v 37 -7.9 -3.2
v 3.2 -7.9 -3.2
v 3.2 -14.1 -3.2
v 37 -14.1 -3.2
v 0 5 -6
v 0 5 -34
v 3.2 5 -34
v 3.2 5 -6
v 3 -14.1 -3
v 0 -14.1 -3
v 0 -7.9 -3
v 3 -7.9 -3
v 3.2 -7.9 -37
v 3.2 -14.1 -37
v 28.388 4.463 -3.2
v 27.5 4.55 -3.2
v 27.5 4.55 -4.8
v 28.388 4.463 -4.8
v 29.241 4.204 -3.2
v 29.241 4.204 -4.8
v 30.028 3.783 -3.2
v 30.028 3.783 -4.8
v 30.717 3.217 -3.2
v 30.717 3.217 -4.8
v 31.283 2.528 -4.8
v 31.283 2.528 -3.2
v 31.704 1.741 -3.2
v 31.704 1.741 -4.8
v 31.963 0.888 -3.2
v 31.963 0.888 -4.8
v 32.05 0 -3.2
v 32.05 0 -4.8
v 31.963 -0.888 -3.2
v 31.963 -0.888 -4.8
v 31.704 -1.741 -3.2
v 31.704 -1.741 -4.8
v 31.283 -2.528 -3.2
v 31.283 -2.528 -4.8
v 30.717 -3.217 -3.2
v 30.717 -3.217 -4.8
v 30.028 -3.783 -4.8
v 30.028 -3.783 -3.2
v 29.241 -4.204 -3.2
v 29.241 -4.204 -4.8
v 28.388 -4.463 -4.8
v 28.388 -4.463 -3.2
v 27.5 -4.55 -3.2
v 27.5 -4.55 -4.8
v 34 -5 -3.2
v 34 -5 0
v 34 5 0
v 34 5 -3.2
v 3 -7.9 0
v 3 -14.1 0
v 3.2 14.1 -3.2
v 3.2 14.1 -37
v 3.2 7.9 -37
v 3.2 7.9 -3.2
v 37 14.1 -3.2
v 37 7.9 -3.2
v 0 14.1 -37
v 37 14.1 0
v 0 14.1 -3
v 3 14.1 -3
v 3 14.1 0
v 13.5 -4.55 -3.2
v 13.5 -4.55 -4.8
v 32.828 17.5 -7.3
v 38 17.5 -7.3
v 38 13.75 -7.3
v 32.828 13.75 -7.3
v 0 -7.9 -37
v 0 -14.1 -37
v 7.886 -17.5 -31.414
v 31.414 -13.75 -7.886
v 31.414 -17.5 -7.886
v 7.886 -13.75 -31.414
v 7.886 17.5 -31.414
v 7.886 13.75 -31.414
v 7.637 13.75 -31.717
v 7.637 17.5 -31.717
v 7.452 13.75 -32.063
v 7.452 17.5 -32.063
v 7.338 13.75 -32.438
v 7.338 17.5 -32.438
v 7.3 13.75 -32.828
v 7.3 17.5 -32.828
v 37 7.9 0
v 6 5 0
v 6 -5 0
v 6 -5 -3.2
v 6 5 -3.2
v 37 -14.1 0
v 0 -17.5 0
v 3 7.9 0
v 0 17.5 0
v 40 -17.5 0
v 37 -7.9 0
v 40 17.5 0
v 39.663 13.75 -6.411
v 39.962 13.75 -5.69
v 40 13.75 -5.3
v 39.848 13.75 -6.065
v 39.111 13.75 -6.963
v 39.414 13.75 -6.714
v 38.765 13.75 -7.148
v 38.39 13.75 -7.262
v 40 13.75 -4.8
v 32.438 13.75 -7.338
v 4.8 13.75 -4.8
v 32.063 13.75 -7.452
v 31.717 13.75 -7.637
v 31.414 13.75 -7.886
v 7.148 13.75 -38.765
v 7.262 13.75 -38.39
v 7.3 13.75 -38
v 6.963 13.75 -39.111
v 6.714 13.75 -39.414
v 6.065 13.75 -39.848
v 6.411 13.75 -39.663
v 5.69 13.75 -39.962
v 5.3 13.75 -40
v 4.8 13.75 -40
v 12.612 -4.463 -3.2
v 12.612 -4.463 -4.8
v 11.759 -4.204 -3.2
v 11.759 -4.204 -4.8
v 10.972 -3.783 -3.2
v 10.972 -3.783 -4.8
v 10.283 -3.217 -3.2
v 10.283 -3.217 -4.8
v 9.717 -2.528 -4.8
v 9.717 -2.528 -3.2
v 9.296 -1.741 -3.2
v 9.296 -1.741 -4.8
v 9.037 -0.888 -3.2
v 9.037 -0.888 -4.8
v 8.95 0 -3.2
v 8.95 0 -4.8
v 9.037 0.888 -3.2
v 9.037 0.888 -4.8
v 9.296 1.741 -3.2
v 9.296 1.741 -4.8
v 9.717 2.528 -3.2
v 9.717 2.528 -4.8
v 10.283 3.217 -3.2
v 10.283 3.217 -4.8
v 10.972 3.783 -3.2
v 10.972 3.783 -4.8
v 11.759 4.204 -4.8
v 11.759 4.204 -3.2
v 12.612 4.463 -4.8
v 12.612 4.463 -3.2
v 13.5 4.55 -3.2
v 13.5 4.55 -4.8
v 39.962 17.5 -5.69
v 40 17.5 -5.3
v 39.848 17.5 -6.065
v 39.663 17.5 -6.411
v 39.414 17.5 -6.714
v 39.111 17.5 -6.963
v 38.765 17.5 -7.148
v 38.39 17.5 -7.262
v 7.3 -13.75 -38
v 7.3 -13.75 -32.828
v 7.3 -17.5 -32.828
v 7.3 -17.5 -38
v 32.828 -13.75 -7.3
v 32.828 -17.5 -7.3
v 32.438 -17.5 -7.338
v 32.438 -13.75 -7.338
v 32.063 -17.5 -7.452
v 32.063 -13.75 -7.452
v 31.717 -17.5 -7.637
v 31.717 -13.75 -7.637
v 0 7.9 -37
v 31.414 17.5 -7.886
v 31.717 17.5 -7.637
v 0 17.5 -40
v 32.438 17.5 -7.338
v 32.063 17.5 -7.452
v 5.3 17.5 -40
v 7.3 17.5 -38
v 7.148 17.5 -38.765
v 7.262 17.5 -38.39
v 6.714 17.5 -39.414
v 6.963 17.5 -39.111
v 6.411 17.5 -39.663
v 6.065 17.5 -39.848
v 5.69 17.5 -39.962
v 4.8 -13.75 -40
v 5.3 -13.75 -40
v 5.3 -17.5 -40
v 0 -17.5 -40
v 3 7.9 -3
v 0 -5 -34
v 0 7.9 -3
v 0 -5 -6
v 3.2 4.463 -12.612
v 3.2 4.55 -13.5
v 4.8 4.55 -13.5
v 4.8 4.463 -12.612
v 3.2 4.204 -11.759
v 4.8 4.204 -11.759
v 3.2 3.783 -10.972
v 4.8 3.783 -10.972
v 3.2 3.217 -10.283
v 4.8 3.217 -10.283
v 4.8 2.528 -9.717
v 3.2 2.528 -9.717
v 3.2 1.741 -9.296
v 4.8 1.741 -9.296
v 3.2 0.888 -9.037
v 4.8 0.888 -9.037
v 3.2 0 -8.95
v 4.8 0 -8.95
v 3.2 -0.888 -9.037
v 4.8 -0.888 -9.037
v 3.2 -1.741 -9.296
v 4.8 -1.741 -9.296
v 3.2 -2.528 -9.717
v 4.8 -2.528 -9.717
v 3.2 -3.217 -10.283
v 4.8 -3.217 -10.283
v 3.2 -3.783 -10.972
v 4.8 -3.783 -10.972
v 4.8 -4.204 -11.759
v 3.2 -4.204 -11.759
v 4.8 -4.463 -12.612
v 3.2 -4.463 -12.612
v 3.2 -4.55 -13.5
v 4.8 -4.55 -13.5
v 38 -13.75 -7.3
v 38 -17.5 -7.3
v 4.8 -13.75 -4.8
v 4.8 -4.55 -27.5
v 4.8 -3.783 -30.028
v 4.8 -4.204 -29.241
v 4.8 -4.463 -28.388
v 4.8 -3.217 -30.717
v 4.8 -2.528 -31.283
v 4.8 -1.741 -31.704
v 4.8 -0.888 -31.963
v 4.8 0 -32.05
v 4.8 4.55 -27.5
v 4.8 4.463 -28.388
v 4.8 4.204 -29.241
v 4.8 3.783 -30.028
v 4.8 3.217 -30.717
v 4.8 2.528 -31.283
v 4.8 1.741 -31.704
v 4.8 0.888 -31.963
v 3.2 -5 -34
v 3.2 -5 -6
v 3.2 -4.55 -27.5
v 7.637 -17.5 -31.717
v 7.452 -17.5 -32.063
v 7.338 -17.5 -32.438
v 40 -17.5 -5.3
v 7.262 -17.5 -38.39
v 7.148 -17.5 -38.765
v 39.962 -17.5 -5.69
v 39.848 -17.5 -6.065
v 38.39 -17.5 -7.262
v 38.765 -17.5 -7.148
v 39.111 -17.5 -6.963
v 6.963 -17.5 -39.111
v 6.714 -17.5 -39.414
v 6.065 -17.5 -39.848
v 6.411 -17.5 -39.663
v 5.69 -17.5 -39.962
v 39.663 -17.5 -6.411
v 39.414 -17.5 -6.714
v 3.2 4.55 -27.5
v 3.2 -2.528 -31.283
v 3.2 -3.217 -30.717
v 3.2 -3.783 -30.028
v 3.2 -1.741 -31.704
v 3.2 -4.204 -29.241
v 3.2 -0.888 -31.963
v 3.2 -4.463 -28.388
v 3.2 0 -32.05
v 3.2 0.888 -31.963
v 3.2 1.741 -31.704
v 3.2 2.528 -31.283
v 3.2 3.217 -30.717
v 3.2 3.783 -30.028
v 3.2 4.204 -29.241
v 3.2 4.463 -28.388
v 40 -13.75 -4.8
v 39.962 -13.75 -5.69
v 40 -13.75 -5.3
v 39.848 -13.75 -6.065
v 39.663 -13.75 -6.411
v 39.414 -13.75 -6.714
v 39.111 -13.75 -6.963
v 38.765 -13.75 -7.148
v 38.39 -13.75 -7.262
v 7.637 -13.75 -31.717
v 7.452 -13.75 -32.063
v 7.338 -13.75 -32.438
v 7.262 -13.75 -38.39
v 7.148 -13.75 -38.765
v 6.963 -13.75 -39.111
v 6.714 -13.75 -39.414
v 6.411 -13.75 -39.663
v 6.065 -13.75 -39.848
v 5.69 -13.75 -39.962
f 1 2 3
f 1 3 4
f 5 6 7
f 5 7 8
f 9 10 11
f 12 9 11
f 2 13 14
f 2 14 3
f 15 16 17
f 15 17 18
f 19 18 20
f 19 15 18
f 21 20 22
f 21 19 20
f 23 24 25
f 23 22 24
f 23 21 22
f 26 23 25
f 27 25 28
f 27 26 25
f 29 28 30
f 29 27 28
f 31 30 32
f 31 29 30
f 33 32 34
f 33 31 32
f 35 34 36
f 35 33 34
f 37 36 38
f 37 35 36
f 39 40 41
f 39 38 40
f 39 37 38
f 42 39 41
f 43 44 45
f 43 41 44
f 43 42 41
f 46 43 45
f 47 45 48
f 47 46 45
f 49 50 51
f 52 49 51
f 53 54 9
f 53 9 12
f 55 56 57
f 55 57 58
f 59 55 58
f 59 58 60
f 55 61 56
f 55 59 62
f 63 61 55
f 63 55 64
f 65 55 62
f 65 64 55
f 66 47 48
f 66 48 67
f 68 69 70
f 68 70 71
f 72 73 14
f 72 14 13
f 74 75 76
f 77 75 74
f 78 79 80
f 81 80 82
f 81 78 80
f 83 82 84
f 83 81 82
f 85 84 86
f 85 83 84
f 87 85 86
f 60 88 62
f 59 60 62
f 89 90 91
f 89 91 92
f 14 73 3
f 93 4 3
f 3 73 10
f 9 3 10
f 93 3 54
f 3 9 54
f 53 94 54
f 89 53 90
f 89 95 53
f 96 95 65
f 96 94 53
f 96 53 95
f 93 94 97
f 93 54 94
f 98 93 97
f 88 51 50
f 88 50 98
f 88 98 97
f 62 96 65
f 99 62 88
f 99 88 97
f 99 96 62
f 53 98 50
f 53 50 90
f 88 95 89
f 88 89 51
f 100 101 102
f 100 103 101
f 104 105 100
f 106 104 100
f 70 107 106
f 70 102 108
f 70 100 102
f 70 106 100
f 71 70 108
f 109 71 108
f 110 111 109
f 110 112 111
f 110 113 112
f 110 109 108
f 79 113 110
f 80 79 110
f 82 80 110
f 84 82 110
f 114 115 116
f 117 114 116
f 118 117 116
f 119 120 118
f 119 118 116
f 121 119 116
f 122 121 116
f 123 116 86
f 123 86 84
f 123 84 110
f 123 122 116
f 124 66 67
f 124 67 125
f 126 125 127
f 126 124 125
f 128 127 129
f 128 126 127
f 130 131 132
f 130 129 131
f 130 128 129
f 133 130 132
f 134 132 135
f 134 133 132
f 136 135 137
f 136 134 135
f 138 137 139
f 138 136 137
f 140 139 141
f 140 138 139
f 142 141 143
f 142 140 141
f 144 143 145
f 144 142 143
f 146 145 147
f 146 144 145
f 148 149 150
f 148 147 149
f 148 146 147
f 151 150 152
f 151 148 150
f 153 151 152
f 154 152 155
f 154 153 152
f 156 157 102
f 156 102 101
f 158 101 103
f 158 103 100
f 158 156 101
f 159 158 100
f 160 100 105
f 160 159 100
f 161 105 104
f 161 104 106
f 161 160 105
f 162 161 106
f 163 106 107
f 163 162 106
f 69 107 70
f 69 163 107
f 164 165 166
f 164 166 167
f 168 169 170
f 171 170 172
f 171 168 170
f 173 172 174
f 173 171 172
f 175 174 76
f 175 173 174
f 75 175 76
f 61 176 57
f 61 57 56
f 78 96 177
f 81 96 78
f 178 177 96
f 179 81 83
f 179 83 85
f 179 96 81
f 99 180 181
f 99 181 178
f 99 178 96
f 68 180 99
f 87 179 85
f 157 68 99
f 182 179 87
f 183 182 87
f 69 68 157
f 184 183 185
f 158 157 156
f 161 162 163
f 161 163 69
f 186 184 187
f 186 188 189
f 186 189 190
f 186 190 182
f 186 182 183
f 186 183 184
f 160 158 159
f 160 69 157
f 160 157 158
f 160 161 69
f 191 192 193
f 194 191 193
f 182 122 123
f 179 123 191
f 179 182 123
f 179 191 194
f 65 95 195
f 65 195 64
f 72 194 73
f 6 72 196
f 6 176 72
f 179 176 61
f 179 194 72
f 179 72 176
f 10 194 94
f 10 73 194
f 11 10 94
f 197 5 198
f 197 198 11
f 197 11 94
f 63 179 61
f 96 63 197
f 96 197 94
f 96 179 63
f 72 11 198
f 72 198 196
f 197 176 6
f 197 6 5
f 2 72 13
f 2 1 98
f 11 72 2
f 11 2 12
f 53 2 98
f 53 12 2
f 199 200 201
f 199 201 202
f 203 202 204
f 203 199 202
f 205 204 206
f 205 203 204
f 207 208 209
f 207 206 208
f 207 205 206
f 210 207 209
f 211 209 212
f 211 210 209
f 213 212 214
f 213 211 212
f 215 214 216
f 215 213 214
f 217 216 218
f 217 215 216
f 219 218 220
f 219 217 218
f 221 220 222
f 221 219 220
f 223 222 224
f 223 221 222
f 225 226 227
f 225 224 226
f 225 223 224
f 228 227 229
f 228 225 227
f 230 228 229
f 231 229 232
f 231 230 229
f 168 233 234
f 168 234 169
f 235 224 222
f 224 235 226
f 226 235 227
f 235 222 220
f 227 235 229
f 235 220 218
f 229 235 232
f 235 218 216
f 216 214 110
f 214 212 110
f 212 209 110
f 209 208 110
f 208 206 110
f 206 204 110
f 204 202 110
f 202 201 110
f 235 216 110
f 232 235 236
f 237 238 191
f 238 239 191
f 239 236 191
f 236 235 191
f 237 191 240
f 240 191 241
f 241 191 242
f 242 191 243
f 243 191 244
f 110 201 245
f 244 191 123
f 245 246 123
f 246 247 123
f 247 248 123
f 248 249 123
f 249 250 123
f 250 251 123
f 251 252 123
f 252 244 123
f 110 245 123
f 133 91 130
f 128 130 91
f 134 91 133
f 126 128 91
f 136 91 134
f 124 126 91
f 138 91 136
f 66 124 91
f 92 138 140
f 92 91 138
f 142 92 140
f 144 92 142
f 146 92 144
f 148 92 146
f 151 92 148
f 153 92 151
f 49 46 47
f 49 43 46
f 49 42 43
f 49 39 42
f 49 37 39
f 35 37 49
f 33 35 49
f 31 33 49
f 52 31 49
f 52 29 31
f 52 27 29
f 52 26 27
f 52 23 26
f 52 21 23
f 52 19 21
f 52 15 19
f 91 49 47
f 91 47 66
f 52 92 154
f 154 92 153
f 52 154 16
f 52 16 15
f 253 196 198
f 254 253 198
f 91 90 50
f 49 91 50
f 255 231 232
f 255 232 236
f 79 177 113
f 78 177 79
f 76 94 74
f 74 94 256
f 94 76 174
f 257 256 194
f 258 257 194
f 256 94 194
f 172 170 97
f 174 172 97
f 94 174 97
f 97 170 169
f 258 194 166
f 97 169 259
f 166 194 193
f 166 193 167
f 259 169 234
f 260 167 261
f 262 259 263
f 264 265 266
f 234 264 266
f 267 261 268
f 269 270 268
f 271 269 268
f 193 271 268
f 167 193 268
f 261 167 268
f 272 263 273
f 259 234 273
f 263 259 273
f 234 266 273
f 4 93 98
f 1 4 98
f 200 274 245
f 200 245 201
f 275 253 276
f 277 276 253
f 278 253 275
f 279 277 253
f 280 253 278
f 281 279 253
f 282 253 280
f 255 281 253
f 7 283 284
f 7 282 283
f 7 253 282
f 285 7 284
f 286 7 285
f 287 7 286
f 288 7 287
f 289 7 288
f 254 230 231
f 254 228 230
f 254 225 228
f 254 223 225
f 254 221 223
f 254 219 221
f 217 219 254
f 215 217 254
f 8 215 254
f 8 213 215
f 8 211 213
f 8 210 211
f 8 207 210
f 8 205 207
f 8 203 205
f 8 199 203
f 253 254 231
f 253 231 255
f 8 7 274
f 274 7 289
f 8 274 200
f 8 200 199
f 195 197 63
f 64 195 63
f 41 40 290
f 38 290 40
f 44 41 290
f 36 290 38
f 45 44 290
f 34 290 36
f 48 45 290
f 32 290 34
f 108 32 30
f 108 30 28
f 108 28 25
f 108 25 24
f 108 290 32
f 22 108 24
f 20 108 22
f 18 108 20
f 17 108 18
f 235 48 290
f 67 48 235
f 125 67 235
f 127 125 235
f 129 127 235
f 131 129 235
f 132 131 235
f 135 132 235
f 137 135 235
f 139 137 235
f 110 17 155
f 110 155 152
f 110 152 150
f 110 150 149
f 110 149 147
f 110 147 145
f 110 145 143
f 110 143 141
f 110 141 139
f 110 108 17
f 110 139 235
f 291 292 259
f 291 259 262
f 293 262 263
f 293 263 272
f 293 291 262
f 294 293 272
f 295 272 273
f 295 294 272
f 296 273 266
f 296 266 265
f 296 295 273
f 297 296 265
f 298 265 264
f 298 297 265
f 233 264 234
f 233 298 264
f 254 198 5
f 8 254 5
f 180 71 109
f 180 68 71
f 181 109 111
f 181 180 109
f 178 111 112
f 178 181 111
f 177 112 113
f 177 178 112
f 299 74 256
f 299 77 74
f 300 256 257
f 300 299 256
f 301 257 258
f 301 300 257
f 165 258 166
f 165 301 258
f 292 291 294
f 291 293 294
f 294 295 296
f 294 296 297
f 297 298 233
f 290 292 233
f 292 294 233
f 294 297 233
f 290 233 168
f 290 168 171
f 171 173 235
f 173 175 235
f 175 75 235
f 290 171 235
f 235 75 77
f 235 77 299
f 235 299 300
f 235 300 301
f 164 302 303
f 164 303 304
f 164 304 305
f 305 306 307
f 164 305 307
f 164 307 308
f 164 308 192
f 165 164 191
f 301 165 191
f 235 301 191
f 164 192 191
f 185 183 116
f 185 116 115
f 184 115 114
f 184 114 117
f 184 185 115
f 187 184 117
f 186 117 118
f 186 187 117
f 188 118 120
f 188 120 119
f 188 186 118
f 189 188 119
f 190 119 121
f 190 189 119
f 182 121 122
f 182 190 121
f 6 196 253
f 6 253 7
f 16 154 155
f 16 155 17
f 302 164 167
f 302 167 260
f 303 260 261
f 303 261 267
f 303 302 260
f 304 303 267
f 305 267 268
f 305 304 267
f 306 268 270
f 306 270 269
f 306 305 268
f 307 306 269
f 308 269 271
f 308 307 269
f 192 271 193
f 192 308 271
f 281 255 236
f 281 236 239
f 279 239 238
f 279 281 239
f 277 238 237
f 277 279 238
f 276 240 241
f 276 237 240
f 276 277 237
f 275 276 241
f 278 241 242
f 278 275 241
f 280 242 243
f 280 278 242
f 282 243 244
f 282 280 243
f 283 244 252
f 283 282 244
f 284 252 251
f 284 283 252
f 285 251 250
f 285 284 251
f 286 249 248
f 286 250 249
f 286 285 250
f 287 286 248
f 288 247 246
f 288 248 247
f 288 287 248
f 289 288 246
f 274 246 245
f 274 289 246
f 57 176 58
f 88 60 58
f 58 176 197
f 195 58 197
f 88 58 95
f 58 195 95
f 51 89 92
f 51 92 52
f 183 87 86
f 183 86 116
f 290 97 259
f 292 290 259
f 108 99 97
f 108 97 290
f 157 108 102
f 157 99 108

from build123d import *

# Parameters (mm, degrees)
EXTRUDE_1_DEPTH     = 17.5
SKETCH_2_W          = 35.2
SKETCH_2_H          = 27.5
CUT_EXTRUDE_1_DEPTH = 35.2
CUT_EXTRUDE_2_DEPTH = 60.213596412
CUT_EXTRUDE_3_DEPTH = 60.213596412
SKETCH_5_W          = 34
SKETCH_5_H          = 6.2
SKETCH_5_W_2        = 28
SKETCH_5_H_2        = 10
CUT_EXTRUDE_4_DEPTH = 3.2
SKETCH_6_W          = 34
SKETCH_6_H          = 6.2
SKETCH_6_W_2        = 28
SKETCH_6_H_2        = 10
CUT_EXTRUDE_5_DEPTH = 3.2
FILLET_1_R          = 2


with BuildPart() as part:
    # Эскиз1 → Бобышка-Вытянуть1 (new, symmetric)
    with BuildSketch(Plane(origin=(0, 0, 0), x_dir=(1, 0, 0), z_dir=(0, 1, 0))):
        with BuildLine():
            Line((0, 40), (0, 0))
            Line((0, 0), (40, 0))
            Line((40, 0), (40, 5.3))
            ThreePointArc((40, 5.3), (39.414213562, 6.714213562), (38, 7.3))
            Line((38, 7.3), (32, 7.3))
            Line((32, 7.3), (7.3, 32))
            Line((7.3, 32), (7.3, 38))
            ThreePointArc((7.3, 38), (6.714213562, 39.414213562), (5.3, 40))
            Line((5.3, 40), (0, 40))
        make_face()
    extrude(amount=EXTRUDE_1_DEPTH, both=True)

    # Эскиз2 → Вырез-Вытянуть1 (cut)
    with BuildSketch(Plane(origin=(0, 0, -40), x_dir=(-1, 0, 0), z_dir=(0, 0, -1))):
        with Locations((-22.4, 0)):
            Rectangle(SKETCH_2_W, SKETCH_2_H)
    extrude(amount=-CUT_EXTRUDE_1_DEPTH, mode=Mode.SUBTRACT)

    # Эскиз3 → Вырез-Вытянуть2 (cut, through all)
    with BuildSketch(Plane.XY):
        with BuildLine():
            Line((13.5, 4.55), (27.5, 4.55))
            ThreePointArc((27.5, 4.55), (32.05, 0), (27.5, -4.55))
            Line((27.5, -4.55), (13.5, -4.55))
            ThreePointArc((13.5, -4.55), (8.95, 0), (13.5, 4.55))
        make_face()
    extrude(amount=-CUT_EXTRUDE_2_DEPTH, mode=Mode.SUBTRACT)

    # Эскиз4 → Вырез-Вытянуть3 (cut, through all)
    with BuildSketch(Plane.ZY):
        with BuildLine():
            Line((-27.5, 4.55), (-13.5, 4.55))
            ThreePointArc((-13.5, 4.55), (-8.95, 0), (-13.5, -4.55))
            Line((-13.5, -4.55), (-27.5, -4.55))
            ThreePointArc((-27.5, -4.55), (-32.05, 0), (-27.5, 4.55))
        make_face()
    extrude(amount=-CUT_EXTRUDE_3_DEPTH, mode=Mode.SUBTRACT)

    # Эскиз5 → Вырез-Вытянуть4 (cut)
    with BuildSketch(Plane.ZY):
        with Locations((-20, 11)):
            Rectangle(SKETCH_5_W, SKETCH_5_H)
        with Locations((-20, -11)):
            Rectangle(SKETCH_5_W, SKETCH_5_H)
        with Locations((-20, 0)):
            Rectangle(SKETCH_5_W_2, SKETCH_5_H_2)
    extrude(amount=-CUT_EXTRUDE_4_DEPTH, mode=Mode.SUBTRACT)

    # Эскиз6 → Вырез-Вытянуть5 (cut)
    with BuildSketch(Plane.XY):
        with Locations((20, 11)):
            Rectangle(SKETCH_6_W, SKETCH_6_H)
        with Locations((20, -11)):
            Rectangle(SKETCH_6_W, SKETCH_6_H)
        with Locations((20, 0)):
            Rectangle(SKETCH_6_W_2, SKETCH_6_H_2)
    extrude(amount=-CUT_EXTRUDE_5_DEPTH, mode=Mode.SUBTRACT)

    # Скругление1
    fillet_1_edges = [part.edges().sort_by_distance(p)[0] for p in [
        (7.3, 15.625, -32),
        (32, 15.625, -7.3),
        (7.3, -15.625, -32),
        (32, -15.625, -7.3),
    ]]
    fillet(fillet_1_edges, radius=FILLET_1_R)


solid = part.part
